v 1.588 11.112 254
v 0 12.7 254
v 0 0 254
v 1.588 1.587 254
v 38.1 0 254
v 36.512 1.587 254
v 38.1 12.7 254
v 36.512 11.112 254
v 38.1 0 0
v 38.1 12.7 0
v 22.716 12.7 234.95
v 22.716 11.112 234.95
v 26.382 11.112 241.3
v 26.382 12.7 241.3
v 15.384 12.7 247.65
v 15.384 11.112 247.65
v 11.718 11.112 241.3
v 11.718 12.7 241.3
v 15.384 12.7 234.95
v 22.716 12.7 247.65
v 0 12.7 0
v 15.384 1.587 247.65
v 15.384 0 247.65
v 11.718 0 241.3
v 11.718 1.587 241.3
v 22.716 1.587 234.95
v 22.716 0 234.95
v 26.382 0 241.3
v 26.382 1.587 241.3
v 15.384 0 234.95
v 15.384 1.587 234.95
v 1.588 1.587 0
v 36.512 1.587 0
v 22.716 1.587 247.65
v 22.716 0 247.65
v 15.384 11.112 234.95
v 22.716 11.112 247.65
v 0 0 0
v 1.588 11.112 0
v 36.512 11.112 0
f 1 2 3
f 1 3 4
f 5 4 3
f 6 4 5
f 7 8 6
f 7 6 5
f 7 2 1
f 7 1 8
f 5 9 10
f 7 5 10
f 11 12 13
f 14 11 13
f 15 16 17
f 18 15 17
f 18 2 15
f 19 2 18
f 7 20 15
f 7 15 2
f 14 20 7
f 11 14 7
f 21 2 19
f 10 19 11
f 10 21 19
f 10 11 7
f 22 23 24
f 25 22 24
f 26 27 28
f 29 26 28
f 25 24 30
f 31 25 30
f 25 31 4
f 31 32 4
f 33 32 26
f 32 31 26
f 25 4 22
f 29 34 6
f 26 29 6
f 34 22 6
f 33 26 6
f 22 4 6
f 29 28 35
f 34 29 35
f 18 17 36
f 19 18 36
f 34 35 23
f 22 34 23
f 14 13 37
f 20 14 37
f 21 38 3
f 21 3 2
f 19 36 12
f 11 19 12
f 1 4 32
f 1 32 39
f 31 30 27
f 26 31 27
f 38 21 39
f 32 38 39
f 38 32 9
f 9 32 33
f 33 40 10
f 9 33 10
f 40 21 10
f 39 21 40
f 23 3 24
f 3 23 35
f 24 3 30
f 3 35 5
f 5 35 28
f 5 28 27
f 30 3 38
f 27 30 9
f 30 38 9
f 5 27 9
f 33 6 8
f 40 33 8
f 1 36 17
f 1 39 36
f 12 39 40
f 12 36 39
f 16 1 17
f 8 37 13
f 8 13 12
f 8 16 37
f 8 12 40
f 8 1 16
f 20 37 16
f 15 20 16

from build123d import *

# Parameters (mm, degrees)
SKETCH1_W           = 38.1
SKETCH1_H           = 12.7
BOSS_EXTRUDE1_DEPTH = 254
SKETCH2_W           = 34.925
SKETCH2_H           = 9.525
CUT_EXTRUDE1_DEPTH  = 258.155400488
CUT_EXTRUDE2_DEPTH  = 258.155400488


with BuildPart() as part:
    # Sketch1 → Boss-Extrude1 (new body)
    with BuildSketch(Plane.XY):
        with Locations((19.05, 6.35)):
            Rectangle(SKETCH1_W, SKETCH1_H)
    extrude(amount=BOSS_EXTRUDE1_DEPTH)

    # Sketch2 → Cut-Extrude1 (cut, through all)
    with BuildSketch(Plane.XY.offset(254)):
        with Locations((19.05, 6.35)):
            Rectangle(SKETCH2_W, SKETCH2_H)
    extrude(amount=-CUT_EXTRUDE1_DEPTH, mode=Mode.SUBTRACT)

    # Sketch3 → Cut-Extrude2 (cut, through all)
    with BuildSketch(Plane.XZ):
        Polygon((26.382348419, 241.3), (22.716174209, 247.65), (15.383825791, 247.65), (11.717651581, 241.3), (15.383825791, 234.95), (22.716174209, 234.95), align=None)
    extrude(amount=-CUT_EXTRUDE2_DEPTH, mode=Mode.SUBTRACT)


solid = part.part
